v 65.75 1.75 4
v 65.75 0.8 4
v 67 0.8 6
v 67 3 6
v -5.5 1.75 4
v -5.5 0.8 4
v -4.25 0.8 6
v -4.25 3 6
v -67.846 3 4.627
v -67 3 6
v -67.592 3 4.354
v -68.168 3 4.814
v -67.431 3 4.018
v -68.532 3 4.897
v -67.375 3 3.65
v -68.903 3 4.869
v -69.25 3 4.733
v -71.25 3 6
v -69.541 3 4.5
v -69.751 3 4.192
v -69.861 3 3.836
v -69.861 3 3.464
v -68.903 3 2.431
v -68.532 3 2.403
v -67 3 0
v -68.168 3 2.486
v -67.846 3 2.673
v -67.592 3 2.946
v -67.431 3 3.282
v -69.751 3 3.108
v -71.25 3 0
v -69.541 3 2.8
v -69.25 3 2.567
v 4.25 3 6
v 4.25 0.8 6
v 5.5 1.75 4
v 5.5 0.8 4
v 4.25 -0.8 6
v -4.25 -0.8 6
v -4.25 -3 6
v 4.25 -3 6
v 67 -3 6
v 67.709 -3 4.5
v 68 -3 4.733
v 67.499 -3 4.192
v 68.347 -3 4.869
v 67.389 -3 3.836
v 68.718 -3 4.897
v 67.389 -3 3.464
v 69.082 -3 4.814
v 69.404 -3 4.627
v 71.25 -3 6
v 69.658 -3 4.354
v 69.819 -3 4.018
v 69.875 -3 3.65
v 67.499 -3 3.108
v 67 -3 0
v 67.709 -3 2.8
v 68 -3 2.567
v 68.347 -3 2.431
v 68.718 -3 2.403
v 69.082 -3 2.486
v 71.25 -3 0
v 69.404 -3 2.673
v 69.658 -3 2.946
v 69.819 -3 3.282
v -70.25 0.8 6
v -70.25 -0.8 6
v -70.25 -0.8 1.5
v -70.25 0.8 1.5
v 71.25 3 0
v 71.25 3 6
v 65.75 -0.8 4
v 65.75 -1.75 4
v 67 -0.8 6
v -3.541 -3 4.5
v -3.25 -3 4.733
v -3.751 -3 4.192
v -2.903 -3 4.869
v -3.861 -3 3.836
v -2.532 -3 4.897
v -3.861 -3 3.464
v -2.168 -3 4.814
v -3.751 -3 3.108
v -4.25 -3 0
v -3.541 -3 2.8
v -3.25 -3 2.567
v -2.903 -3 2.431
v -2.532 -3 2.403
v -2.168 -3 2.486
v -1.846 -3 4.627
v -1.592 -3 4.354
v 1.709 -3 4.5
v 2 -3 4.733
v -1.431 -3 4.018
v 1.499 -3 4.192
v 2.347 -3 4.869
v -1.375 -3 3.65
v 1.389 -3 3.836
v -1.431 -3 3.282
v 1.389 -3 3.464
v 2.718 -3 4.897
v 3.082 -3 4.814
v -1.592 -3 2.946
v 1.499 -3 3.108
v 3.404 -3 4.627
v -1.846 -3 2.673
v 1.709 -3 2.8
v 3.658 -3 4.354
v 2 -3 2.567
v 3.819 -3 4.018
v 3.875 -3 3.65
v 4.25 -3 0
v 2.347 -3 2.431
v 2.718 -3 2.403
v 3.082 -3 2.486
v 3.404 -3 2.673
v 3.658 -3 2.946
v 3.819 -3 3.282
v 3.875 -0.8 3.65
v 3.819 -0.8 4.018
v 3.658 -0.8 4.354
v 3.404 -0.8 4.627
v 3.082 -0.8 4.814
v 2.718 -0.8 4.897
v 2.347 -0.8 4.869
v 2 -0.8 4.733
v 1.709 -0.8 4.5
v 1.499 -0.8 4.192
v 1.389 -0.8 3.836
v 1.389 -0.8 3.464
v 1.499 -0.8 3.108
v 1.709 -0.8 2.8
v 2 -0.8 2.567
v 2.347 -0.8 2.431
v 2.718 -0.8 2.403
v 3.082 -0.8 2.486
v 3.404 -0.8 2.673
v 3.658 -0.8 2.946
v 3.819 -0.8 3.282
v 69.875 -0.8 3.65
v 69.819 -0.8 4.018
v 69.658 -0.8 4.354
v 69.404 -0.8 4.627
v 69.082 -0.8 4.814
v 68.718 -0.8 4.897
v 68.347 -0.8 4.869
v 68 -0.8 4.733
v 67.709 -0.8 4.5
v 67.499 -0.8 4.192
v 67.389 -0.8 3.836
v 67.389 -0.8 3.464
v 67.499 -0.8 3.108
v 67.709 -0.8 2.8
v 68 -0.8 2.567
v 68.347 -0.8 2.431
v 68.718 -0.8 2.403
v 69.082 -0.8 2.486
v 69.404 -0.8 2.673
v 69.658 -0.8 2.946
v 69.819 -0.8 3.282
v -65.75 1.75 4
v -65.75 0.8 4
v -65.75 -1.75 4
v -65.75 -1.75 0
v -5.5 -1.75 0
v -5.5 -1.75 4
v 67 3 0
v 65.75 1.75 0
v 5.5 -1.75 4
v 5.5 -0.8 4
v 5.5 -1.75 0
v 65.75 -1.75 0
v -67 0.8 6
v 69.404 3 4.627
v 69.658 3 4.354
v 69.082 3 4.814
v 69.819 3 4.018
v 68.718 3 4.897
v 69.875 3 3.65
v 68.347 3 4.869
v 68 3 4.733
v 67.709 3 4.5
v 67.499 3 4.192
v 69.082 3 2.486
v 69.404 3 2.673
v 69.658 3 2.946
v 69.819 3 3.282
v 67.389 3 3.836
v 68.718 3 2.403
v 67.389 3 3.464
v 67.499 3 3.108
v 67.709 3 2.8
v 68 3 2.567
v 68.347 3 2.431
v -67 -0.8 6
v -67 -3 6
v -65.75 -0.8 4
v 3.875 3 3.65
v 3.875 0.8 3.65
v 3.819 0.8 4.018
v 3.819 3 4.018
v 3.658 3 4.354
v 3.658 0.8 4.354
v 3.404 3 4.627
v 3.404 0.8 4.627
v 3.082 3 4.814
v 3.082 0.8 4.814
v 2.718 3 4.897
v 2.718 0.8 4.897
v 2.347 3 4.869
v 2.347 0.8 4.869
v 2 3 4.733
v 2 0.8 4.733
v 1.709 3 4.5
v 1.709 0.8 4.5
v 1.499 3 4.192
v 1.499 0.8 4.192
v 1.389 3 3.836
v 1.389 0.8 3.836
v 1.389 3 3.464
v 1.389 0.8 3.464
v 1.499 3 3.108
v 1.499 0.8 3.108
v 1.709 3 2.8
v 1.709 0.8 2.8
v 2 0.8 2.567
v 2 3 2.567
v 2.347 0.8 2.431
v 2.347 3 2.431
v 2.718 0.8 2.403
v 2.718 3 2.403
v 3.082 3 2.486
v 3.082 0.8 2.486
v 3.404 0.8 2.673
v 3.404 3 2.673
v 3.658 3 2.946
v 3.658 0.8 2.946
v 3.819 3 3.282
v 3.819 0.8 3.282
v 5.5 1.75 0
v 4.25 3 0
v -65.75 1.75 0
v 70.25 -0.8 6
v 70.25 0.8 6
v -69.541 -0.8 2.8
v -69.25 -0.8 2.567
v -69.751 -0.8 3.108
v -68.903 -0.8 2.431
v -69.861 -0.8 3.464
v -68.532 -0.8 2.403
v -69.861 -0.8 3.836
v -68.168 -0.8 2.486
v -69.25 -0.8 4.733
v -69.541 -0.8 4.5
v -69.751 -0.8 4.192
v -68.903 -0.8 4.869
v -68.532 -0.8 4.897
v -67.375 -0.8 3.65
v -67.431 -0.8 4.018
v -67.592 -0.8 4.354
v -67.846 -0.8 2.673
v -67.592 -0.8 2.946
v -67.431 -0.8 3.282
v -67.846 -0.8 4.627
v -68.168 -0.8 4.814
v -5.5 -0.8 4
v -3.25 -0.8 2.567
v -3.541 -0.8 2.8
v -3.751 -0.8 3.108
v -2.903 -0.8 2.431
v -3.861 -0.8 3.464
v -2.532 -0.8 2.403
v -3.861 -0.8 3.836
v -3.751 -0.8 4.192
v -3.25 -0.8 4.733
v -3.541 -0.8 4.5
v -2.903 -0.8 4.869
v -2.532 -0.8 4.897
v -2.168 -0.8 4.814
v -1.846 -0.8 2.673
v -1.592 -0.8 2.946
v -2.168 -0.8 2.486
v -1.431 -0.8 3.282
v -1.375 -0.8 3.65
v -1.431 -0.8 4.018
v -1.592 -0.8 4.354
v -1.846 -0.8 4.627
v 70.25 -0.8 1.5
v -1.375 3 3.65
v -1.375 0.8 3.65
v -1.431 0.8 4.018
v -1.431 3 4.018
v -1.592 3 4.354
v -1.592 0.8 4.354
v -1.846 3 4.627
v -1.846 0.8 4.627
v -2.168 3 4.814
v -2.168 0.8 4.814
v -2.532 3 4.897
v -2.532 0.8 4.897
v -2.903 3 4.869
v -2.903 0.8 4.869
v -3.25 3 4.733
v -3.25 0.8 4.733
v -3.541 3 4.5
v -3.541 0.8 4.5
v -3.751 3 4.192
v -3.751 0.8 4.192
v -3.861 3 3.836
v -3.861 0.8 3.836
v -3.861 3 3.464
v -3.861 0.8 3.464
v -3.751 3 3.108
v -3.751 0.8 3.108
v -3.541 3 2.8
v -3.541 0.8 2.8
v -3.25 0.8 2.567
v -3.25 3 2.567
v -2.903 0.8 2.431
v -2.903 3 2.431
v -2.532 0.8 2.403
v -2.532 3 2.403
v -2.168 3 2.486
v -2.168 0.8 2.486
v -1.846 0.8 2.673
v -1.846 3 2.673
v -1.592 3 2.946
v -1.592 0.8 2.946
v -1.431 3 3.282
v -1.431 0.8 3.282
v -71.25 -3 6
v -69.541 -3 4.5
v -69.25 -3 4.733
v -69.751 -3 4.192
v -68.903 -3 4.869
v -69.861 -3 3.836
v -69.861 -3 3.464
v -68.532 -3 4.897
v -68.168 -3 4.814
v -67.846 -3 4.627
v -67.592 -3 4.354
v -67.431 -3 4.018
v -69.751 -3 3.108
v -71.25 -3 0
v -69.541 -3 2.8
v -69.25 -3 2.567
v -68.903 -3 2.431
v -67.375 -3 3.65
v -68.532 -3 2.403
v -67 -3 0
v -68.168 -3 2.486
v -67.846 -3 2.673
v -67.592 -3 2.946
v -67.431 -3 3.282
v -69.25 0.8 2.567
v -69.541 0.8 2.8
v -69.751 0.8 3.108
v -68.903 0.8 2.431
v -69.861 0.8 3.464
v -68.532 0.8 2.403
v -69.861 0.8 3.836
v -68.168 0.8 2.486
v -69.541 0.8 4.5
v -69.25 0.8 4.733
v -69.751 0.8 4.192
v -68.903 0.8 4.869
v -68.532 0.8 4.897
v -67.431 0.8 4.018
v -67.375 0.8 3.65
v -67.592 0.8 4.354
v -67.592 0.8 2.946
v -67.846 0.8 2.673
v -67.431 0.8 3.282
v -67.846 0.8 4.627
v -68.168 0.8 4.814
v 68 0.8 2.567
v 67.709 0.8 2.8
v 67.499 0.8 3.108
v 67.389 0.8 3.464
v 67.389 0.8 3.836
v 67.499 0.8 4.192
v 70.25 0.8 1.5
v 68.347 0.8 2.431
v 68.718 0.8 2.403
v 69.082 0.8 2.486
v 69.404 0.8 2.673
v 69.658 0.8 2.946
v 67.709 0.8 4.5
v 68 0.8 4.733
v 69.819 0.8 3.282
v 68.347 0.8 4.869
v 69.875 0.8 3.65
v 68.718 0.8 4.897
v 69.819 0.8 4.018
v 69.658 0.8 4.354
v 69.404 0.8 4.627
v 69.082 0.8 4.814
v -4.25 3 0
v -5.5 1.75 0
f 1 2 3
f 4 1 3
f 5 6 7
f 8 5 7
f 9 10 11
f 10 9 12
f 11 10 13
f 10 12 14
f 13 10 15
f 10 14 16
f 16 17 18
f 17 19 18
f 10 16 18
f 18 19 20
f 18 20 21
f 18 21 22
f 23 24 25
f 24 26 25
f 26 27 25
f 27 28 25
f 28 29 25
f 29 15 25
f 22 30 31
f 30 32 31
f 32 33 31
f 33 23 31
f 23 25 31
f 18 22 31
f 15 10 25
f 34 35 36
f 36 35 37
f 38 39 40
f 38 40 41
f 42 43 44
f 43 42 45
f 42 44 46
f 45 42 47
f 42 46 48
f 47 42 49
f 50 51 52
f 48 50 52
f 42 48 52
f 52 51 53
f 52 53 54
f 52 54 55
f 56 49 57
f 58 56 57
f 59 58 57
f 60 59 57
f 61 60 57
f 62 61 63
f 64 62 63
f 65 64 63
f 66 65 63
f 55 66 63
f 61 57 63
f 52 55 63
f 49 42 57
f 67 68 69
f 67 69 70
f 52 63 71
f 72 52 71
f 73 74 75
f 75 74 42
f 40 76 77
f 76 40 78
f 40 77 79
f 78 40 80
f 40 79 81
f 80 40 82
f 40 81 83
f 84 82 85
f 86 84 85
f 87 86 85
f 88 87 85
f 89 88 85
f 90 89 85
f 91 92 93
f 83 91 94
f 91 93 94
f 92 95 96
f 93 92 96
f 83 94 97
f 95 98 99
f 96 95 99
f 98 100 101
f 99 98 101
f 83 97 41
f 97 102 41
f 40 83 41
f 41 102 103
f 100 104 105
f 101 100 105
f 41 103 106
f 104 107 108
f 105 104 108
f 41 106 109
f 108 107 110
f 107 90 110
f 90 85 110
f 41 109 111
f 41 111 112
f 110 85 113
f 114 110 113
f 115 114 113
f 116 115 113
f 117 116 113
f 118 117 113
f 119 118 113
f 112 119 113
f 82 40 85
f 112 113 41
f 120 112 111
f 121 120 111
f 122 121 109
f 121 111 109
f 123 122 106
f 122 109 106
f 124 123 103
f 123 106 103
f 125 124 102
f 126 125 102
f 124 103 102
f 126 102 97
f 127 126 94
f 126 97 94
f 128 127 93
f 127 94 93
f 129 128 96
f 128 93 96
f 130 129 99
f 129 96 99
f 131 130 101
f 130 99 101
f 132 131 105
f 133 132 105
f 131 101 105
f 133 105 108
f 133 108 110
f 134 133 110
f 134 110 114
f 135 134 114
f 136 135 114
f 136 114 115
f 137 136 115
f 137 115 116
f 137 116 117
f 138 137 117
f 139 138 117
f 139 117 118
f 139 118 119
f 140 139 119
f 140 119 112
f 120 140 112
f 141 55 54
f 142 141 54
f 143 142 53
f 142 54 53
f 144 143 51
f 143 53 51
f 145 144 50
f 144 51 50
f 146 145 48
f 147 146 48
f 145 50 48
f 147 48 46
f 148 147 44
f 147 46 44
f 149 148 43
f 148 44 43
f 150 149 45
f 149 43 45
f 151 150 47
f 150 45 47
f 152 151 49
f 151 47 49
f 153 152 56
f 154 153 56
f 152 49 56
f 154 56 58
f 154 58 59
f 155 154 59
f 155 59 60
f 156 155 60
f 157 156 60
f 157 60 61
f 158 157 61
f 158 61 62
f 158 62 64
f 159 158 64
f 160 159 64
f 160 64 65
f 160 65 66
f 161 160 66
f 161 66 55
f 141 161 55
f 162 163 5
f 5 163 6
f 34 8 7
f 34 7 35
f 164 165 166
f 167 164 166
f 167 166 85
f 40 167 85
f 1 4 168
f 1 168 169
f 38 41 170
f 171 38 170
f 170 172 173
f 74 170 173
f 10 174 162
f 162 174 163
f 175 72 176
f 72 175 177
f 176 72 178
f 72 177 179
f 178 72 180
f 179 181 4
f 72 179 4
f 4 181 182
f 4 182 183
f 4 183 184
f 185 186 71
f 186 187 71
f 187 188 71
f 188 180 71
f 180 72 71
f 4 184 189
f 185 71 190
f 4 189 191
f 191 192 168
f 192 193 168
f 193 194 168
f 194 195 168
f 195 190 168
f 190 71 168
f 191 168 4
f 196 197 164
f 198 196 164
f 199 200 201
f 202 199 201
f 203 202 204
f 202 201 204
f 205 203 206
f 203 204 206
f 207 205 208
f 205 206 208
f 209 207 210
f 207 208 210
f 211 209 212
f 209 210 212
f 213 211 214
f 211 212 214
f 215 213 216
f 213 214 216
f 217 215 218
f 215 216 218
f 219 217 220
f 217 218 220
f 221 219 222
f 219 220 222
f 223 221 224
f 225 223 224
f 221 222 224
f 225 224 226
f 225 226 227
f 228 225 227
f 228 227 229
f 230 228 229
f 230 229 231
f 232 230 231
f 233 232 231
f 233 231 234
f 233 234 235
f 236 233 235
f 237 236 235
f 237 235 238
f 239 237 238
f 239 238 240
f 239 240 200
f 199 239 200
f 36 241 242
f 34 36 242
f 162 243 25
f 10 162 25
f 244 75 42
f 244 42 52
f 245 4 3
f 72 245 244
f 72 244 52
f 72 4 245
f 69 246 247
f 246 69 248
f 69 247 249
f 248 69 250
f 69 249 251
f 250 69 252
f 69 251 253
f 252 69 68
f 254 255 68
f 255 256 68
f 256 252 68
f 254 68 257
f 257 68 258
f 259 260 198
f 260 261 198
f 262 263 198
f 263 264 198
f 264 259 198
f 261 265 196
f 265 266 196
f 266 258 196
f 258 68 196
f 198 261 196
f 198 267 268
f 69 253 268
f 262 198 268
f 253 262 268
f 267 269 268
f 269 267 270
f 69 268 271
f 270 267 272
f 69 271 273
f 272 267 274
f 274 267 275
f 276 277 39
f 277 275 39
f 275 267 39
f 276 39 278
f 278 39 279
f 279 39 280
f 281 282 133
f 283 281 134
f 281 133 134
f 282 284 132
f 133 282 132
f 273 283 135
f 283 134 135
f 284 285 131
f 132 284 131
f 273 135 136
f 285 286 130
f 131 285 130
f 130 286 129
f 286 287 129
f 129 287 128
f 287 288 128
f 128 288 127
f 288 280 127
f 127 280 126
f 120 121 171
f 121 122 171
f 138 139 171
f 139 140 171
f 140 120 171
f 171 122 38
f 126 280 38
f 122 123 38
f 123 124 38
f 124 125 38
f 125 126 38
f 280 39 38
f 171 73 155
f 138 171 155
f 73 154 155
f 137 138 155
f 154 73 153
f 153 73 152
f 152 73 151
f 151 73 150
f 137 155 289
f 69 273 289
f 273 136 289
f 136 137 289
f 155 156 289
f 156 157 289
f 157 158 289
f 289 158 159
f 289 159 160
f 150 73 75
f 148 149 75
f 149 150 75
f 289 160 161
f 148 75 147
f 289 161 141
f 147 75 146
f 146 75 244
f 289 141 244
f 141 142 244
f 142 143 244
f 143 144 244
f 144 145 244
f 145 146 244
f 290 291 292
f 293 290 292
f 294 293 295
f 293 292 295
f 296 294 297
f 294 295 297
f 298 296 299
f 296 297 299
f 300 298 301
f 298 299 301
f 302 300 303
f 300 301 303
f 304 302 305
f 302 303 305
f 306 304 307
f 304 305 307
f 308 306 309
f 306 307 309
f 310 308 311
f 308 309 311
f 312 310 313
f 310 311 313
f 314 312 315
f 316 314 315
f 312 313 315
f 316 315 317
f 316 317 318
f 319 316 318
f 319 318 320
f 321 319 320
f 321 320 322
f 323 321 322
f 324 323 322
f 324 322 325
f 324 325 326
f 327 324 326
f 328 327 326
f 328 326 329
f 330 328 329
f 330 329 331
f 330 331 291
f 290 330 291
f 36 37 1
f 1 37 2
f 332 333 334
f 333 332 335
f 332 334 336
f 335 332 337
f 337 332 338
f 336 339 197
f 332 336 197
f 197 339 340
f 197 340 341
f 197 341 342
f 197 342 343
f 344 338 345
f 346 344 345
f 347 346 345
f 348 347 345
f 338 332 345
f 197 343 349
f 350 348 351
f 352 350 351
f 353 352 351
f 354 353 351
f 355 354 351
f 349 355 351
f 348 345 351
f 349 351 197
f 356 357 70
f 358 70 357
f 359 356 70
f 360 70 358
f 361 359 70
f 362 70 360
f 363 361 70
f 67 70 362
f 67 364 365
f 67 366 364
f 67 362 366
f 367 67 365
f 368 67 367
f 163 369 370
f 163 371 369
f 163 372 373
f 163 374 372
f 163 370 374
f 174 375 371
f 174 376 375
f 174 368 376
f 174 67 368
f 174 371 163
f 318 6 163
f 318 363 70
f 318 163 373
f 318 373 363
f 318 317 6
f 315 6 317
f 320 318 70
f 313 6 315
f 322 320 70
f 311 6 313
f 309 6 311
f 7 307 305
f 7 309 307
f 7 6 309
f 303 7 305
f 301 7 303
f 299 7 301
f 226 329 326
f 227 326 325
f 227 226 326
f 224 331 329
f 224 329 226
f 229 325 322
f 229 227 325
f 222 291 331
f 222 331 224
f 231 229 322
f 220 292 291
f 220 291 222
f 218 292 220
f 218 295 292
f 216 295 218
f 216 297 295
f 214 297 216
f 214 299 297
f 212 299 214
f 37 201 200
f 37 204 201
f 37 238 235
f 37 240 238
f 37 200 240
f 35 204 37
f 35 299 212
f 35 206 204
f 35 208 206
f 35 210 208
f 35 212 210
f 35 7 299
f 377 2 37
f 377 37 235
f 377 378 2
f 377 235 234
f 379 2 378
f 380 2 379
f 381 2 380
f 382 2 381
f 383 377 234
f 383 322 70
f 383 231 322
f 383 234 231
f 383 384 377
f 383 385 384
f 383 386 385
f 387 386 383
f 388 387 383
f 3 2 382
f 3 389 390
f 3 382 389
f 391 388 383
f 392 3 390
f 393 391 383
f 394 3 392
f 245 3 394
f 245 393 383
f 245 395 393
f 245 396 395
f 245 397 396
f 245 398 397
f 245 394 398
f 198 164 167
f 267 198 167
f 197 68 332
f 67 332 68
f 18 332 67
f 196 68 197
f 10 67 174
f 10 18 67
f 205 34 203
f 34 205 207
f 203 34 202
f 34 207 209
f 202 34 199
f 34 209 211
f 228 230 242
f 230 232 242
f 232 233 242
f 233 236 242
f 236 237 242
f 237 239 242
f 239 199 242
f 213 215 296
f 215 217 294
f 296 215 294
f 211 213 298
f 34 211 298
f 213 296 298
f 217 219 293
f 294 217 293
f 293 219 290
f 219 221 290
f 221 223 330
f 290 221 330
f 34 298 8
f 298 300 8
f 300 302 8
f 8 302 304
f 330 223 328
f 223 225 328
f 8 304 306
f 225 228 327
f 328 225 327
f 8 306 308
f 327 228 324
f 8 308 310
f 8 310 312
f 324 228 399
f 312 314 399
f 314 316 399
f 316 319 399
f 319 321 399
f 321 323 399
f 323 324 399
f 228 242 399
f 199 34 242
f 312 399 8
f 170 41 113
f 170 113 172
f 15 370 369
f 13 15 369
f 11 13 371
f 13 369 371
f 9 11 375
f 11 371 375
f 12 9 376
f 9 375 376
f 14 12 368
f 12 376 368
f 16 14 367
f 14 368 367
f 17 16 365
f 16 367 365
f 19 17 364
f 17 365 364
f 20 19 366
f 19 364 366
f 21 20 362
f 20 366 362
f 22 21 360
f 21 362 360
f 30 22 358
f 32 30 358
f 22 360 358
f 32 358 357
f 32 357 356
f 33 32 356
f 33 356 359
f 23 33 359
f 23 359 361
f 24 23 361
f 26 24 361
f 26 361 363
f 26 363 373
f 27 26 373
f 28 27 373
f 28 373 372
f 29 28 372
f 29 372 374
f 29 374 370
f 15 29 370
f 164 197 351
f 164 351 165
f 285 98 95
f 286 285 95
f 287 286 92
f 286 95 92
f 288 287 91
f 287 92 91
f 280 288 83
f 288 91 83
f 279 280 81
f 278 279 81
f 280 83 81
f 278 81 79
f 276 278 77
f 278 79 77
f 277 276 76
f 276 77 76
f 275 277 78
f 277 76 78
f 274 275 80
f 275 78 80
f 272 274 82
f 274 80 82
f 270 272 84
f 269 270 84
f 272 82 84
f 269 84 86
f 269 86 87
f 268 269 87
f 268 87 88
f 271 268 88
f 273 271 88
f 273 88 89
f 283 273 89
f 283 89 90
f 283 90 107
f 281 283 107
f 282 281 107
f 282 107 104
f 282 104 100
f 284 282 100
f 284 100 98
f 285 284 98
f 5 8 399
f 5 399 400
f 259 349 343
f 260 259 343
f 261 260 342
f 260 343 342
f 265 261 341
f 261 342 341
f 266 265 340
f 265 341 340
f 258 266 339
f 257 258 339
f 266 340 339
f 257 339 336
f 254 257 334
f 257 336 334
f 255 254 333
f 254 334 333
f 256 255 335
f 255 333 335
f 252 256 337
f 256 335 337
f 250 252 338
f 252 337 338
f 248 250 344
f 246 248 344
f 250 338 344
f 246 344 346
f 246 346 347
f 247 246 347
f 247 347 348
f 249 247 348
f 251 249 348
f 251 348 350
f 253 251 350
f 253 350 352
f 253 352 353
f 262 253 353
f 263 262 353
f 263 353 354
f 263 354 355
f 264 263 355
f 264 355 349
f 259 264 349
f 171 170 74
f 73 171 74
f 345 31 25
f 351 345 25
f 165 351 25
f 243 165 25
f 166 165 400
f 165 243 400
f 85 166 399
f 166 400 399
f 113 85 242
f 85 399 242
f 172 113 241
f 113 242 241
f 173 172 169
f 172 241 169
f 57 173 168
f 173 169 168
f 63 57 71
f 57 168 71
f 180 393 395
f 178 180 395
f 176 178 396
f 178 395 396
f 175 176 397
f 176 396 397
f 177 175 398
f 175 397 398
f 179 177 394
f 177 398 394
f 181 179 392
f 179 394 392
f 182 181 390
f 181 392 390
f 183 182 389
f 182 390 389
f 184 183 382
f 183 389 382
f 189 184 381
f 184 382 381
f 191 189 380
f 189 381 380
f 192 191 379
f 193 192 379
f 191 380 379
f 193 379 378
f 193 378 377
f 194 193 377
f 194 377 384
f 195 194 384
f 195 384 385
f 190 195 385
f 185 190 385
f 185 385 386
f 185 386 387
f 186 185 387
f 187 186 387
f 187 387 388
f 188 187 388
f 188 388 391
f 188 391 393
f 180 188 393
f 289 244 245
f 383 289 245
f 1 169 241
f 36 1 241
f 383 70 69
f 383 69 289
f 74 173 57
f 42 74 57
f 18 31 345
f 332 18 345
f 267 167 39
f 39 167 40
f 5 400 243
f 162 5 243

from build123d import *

# Parameters (mm, degrees)
PAD_DEPTH       = 6
SKETCH001_W     = 140.5
SKETCH001_H     = 1.6
POCKET_DEPTH    = 4.5
SKETCH002_R     = 1.25
POCKET001_DEPTH = 6.001


with BuildPart() as part:
    # Sketch → Pad (new body)
    with BuildSketch(Plane.XY):
        Polygon((-71.25, 3), (-71.25, -3), (-67, -3), (-65.75, -1.75), (-5.5, -1.75), (-4.25, -3), (4.25, -3), (5.5, -1.75), (65.75, -1.75), (67, -3), (71.25, -3), (71.25, 3), (67, 3), (65.75, 1.75), (5.5, 1.75), (4.25, 3), (-4.25, 3), (-5.5, 1.75), (-65.75, 1.75), (-67, 3), align=None)
    extrude(amount=PAD_DEPTH)

    # Sketch001 (on Face22 of Pad) → Pocket (cut)
    with BuildSketch(Plane.XY.offset(6)):
        Rectangle(SKETCH001_W, SKETCH001_H)
    extrude(amount=-POCKET_DEPTH, mode=Mode.SUBTRACT)

    # Sketch002 (on Face10 of Pocket) → Pocket001 (cut, through all)
    with BuildSketch(Plane.XZ.offset(3)):
        with Locations((-68.625, 3.65)):
            Circle(SKETCH002_R)
        with Locations((-2.625, 3.65)):
            Circle(SKETCH002_R)
        with Locations((2.625, 3.65)):
            Circle(SKETCH002_R)
        with Locations((68.625, 3.65)):
            Circle(SKETCH002_R)
        Polygon((-67, 6), (-65.75, 4), (-5.5, 4), (-4.25, 6), align=None)
        Polygon((4.25, 6), (5.5, 4), (65.75, 4), (67, 6), align=None)
    extrude(amount=-POCKET001_DEPTH, mode=Mode.SUBTRACT)


solid = part.part
